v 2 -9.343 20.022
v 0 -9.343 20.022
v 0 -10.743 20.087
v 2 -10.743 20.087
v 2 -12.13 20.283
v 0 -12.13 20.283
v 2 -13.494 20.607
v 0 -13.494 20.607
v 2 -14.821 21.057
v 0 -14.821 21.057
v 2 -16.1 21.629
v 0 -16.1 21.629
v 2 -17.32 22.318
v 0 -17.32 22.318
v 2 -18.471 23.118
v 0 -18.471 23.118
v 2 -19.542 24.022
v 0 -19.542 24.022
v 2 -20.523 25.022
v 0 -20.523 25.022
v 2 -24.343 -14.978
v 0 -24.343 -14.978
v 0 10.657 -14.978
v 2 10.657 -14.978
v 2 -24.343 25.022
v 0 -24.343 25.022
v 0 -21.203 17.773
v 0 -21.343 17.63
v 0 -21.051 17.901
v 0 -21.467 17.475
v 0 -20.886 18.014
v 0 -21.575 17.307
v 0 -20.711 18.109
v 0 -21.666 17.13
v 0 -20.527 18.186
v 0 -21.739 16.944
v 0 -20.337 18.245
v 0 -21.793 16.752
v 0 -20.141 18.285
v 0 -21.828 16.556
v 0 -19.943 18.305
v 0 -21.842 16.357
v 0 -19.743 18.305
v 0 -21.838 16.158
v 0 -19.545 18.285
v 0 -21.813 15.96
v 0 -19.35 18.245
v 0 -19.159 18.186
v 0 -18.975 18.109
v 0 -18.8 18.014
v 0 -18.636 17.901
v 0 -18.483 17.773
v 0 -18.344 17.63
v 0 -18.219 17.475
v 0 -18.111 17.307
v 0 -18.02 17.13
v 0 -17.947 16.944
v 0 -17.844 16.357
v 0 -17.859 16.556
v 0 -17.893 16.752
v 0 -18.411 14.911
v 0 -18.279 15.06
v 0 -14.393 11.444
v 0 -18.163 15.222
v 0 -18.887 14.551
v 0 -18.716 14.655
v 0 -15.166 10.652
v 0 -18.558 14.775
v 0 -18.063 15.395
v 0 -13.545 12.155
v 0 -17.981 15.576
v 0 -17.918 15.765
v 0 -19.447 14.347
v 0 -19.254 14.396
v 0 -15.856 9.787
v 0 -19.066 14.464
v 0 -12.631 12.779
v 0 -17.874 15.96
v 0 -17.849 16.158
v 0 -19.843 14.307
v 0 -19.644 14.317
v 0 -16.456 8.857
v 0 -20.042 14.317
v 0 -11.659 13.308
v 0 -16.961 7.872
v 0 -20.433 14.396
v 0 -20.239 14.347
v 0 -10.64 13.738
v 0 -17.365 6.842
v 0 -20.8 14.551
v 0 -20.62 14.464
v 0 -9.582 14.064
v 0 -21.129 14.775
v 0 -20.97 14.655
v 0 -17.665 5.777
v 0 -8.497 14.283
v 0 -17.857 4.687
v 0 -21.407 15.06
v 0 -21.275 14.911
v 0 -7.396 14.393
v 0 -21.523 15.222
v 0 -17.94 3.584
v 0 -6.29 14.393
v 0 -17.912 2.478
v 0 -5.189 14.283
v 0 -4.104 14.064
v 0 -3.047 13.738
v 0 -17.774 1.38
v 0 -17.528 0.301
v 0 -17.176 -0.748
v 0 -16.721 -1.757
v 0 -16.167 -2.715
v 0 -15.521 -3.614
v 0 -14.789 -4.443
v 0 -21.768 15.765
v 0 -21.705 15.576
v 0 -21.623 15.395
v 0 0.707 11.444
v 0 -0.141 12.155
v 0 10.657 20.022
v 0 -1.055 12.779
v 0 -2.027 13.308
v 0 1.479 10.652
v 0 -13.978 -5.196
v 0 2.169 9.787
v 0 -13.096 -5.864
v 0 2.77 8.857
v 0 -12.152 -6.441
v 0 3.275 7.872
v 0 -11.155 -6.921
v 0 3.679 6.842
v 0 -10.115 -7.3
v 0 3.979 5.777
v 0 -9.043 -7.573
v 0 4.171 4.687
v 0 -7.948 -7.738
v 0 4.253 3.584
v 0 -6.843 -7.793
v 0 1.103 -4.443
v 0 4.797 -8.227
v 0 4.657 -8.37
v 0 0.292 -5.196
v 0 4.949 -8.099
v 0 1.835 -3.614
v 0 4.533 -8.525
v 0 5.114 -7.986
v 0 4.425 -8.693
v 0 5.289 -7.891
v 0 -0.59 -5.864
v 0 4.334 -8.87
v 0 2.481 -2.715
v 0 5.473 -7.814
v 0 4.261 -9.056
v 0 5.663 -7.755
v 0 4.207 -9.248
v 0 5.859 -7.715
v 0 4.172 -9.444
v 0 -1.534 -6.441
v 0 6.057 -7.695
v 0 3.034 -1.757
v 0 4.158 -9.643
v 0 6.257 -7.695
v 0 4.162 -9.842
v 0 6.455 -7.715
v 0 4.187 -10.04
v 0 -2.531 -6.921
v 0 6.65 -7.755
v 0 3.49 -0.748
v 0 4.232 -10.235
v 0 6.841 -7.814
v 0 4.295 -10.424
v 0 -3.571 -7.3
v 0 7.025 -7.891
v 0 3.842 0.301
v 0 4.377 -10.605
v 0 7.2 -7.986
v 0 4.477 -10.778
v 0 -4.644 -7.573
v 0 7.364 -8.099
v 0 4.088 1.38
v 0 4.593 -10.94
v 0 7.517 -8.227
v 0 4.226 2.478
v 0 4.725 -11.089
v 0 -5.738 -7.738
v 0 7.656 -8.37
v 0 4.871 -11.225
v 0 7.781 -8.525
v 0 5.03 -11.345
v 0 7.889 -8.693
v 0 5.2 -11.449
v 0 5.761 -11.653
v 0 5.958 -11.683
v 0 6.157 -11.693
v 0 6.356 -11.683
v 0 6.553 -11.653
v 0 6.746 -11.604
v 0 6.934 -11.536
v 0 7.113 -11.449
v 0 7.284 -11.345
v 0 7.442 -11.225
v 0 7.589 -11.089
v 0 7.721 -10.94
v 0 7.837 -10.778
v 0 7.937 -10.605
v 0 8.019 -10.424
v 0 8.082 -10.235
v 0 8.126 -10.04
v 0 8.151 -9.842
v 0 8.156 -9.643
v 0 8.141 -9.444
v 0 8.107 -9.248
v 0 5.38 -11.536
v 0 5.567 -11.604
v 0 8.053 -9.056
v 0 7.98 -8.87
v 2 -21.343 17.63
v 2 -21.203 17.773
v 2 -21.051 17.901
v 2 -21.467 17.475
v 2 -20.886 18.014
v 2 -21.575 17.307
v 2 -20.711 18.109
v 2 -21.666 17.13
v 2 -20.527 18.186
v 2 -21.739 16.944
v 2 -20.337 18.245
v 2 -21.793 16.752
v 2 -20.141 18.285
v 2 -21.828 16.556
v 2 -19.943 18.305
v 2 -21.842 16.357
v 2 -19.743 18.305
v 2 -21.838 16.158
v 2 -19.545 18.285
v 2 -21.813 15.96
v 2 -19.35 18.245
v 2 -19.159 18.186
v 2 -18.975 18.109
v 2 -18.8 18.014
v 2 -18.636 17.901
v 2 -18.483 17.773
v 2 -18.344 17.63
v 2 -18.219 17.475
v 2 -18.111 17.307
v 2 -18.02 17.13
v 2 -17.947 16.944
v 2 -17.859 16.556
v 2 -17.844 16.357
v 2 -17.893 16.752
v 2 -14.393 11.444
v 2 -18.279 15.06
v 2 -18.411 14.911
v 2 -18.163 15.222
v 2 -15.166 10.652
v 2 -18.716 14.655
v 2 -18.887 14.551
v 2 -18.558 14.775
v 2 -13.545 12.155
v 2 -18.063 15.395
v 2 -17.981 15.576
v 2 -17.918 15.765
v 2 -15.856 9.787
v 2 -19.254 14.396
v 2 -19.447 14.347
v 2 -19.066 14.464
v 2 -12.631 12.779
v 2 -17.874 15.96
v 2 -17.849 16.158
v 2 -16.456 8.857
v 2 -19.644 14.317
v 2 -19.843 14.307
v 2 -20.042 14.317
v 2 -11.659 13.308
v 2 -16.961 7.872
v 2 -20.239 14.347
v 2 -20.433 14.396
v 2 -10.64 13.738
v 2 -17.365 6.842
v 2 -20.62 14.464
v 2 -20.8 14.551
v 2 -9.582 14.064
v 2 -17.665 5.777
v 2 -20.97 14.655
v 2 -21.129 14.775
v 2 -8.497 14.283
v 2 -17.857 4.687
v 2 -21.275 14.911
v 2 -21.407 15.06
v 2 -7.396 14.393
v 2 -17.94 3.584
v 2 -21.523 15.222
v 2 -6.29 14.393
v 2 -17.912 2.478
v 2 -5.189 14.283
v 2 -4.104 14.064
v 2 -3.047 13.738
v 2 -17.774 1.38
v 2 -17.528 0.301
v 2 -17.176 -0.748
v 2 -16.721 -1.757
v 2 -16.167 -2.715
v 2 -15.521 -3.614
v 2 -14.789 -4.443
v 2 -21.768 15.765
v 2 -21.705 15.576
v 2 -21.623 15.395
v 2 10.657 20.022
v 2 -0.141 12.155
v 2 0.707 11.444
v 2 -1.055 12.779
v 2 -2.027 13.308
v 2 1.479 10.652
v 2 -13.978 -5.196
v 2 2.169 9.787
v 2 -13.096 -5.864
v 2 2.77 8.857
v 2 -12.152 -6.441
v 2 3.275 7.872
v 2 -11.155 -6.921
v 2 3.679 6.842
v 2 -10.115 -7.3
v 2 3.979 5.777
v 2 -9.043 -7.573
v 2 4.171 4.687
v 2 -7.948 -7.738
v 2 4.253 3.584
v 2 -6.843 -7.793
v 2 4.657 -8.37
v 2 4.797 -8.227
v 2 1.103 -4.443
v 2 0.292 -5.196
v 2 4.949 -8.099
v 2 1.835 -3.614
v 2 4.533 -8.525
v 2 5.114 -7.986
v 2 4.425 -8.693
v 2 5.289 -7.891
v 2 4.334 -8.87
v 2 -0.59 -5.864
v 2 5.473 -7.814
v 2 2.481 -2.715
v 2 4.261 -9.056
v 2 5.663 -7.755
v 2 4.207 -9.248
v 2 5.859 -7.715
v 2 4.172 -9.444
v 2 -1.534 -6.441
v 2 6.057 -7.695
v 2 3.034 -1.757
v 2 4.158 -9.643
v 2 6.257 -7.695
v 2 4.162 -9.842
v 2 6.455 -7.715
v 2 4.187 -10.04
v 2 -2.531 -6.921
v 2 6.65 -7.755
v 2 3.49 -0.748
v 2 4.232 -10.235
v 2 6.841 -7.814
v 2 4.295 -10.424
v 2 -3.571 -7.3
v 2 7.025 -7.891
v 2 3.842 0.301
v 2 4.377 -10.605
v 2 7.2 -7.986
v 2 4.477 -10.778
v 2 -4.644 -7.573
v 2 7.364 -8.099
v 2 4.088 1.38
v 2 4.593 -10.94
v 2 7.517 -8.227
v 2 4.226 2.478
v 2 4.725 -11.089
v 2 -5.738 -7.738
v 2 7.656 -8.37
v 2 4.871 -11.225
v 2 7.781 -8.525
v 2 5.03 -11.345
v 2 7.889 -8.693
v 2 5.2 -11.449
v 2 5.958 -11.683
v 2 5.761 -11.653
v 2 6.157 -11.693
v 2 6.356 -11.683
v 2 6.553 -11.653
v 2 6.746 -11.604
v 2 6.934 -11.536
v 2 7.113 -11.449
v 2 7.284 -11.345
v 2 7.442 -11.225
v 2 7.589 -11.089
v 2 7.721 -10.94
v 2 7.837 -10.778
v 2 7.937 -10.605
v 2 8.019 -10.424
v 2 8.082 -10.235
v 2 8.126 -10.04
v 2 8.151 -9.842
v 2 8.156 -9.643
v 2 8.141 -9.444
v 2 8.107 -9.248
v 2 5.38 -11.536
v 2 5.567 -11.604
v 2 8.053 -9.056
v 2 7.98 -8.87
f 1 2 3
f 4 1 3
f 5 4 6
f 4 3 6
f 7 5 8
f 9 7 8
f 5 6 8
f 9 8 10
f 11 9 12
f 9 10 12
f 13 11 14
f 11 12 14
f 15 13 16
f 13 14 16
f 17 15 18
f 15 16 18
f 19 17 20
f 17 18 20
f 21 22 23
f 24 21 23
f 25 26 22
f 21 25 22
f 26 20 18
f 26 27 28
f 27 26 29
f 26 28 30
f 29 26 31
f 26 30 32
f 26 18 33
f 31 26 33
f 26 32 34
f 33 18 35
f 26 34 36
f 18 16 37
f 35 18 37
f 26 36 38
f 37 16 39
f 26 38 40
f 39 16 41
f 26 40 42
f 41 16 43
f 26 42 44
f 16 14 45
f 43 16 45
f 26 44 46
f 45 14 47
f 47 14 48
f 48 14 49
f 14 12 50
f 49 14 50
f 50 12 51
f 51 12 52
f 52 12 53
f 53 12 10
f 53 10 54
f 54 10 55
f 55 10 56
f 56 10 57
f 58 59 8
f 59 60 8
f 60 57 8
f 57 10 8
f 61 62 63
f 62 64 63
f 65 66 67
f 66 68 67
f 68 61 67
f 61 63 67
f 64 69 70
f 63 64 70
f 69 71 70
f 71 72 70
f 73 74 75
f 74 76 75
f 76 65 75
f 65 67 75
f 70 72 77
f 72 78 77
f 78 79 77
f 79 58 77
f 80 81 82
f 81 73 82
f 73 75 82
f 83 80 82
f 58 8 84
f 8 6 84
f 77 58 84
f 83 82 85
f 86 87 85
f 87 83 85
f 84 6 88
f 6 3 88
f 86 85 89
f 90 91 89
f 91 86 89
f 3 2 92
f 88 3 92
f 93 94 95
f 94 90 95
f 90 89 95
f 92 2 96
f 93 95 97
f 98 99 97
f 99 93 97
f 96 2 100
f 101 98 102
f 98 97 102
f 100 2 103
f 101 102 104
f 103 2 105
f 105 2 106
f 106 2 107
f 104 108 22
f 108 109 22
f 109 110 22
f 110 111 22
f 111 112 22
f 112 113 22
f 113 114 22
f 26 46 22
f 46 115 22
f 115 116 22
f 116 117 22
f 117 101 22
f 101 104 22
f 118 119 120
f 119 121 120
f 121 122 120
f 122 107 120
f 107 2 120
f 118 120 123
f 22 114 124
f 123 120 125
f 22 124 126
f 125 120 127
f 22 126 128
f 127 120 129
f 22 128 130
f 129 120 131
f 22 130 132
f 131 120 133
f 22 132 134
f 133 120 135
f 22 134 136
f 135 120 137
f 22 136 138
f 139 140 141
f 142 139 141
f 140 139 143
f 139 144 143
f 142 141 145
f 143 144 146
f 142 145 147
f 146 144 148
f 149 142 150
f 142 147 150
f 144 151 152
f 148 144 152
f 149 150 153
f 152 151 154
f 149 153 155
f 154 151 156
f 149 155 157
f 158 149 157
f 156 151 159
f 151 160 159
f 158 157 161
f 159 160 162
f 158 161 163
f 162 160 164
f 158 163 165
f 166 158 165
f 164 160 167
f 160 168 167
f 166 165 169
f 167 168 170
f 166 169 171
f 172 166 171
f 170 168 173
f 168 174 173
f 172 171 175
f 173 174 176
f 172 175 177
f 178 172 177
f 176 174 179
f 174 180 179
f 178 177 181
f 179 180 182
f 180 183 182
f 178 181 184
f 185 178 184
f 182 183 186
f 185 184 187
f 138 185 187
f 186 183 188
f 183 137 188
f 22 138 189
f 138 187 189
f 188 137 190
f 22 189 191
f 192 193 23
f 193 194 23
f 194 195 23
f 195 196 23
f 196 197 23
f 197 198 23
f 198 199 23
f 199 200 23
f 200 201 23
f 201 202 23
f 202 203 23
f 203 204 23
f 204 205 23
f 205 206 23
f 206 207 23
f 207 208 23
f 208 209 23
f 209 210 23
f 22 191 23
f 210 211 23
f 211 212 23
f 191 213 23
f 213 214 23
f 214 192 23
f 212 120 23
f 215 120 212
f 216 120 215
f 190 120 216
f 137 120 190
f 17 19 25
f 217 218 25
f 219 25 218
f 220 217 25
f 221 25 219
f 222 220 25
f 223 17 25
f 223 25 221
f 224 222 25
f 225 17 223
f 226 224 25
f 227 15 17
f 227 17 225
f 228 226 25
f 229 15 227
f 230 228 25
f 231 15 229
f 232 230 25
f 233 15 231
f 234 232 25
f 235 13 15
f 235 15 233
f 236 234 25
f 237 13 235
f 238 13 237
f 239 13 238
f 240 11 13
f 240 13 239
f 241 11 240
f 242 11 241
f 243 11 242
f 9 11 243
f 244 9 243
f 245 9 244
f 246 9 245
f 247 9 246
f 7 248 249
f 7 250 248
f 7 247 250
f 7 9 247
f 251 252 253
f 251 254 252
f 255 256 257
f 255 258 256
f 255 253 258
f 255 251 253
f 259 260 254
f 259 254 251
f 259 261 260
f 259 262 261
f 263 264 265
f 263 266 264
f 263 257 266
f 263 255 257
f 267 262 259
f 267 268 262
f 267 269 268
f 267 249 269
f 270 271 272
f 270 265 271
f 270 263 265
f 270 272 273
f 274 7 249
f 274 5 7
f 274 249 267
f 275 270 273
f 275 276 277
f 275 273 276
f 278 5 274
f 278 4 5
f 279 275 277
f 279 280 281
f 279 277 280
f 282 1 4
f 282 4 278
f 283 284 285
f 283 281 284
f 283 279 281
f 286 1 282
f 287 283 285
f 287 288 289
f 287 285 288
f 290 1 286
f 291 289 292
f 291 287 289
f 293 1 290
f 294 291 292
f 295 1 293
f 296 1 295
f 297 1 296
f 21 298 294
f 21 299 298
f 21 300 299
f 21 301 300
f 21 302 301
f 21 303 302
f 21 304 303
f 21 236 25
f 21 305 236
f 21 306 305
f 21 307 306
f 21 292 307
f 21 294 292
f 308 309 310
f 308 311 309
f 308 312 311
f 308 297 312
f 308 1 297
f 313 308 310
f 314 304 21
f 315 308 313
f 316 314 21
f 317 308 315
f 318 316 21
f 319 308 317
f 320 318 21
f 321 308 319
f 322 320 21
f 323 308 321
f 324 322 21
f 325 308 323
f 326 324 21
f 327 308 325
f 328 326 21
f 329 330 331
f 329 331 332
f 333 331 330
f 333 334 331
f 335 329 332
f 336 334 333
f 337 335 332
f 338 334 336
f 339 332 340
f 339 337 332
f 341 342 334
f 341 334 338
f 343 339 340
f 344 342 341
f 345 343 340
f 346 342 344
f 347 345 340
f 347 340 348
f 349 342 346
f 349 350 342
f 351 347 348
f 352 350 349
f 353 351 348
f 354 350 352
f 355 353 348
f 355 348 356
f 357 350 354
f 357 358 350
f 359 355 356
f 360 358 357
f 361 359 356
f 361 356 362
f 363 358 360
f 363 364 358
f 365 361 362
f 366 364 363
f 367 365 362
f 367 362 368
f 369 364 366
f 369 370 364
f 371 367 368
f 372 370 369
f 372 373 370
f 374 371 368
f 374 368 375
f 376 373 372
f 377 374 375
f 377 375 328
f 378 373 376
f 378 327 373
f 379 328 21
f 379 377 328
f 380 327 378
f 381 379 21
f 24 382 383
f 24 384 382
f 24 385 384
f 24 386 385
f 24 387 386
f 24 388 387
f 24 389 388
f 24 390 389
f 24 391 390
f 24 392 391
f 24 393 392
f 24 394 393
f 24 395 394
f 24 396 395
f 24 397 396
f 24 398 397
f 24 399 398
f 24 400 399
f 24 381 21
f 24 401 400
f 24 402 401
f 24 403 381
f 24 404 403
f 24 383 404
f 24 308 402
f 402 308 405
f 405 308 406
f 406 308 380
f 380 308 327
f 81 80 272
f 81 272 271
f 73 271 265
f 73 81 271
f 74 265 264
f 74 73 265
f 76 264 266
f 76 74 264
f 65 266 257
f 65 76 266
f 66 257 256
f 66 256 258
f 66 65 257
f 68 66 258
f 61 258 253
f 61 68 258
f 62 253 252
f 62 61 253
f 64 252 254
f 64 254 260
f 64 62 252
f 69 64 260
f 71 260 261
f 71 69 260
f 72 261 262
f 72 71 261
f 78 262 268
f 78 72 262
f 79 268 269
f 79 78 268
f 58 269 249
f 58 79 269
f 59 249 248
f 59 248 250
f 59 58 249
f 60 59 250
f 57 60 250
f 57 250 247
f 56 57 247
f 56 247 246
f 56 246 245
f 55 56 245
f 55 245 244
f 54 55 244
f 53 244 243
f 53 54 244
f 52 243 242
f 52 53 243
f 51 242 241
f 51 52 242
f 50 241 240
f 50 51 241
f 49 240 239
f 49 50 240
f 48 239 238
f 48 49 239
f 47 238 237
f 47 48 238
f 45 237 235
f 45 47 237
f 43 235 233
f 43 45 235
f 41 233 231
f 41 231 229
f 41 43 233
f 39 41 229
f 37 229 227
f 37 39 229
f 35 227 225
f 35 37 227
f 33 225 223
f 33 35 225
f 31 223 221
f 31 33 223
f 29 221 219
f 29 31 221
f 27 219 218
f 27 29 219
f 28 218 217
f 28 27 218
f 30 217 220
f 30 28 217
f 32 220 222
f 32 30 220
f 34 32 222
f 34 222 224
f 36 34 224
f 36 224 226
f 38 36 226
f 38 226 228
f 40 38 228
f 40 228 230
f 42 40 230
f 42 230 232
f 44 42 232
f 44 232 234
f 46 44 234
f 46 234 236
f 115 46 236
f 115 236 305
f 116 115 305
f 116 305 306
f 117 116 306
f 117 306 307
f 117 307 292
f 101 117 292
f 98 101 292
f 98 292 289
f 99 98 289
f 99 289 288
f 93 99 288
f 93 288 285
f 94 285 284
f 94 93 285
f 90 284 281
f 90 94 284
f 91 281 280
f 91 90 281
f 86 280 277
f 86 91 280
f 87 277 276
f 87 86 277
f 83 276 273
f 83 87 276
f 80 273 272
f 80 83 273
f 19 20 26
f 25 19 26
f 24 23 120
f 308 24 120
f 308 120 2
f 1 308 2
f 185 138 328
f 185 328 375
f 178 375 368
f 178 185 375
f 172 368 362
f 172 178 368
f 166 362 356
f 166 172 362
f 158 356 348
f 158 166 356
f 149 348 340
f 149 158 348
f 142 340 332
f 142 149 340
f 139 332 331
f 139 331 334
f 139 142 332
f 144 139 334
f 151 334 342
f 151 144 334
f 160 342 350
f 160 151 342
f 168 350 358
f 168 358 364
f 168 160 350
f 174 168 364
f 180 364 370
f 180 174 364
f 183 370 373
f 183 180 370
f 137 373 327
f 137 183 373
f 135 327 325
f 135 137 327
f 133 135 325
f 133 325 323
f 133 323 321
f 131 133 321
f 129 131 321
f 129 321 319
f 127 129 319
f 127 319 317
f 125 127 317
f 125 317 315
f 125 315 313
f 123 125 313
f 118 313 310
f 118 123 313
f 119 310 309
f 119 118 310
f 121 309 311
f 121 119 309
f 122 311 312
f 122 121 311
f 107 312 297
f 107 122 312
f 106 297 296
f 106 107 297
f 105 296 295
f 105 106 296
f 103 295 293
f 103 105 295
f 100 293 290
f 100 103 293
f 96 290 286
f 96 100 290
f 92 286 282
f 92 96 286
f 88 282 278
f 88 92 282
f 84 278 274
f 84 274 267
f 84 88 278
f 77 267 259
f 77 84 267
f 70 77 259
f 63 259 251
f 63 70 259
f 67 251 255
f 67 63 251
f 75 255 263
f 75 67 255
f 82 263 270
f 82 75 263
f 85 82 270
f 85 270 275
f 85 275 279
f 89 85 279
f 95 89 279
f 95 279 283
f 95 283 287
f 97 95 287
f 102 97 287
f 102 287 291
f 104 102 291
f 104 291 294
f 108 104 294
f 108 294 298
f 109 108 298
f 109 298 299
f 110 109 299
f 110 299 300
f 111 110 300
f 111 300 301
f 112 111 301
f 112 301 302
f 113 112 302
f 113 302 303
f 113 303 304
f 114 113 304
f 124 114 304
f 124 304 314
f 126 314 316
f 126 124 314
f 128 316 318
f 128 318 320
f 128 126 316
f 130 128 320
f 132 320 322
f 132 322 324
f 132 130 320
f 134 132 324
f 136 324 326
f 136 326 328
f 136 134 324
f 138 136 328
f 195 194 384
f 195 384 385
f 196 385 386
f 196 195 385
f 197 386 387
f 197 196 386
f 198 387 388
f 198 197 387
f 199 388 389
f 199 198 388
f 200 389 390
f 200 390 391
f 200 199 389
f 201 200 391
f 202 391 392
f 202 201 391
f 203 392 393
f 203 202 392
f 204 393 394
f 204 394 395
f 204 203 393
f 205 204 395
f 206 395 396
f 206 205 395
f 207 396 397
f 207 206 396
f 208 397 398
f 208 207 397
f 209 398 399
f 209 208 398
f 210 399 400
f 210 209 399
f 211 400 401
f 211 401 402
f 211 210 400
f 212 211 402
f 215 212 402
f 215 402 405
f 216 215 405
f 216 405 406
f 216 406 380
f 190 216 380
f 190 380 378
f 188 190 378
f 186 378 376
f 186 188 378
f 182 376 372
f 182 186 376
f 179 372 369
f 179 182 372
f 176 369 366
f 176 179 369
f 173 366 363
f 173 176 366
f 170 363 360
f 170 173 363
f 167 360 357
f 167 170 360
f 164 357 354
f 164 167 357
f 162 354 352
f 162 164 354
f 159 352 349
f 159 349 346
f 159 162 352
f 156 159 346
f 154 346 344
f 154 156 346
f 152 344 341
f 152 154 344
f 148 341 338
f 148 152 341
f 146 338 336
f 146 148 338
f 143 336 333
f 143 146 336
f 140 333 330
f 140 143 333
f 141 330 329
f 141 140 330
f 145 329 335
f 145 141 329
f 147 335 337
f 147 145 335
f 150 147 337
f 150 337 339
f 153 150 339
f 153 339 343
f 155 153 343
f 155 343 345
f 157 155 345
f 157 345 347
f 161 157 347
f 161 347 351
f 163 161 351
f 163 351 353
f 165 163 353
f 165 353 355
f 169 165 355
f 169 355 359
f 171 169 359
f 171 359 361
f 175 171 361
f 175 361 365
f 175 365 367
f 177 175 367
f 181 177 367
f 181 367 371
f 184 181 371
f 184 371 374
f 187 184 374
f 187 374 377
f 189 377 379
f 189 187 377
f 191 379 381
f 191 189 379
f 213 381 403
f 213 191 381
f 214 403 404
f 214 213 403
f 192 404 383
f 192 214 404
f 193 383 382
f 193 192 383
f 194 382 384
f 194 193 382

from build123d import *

# Parameters (mm, degrees)
SKETCH1_R           = 2
SKETCH1_R_2         = 11.1
BOSS_EXTRUDE1_DEPTH = 2


with BuildPart() as part:
    # Sketch1 → Boss-Extrude1 (new body)
    with BuildSketch(Plane(origin=(0, 0, 0), x_dir=(0, 0, -1), z_dir=(1, 0, 0))):
        with BuildLine():
            Line((14.978419371, -24.343119081), (14.978419371, 10.656880919))
            Line((14.978419371, 10.656880919), (-20.021580629, 10.656880919))
            Line((-20.021580629, 10.656880919), (-20.021580629, -9.343119081))
            ThreePointArc((-20.021580629, -9.343119081), (-21.328516692, -15.466843438), (-25.021580629, -20.523458968))
            Line((-25.021580629, -20.523458968), (-25.021580629, -24.343119081))
            Line((-25.021580629, -24.343119081), (14.978419371, -24.343119081))
        make_face()
        with Locations((9.692898744, 6.156880919)):
            Circle(SKETCH1_R, mode=Mode.SUBTRACT)
        with Locations((-16.307101256, -19.843119081)):
            Circle(SKETCH1_R, mode=Mode.SUBTRACT)
        with Locations((-3.307101256, -6.843119081)):
            Circle(SKETCH1_R_2, mode=Mode.SUBTRACT)
    extrude(amount=BOSS_EXTRUDE1_DEPTH)


solid = part.part
